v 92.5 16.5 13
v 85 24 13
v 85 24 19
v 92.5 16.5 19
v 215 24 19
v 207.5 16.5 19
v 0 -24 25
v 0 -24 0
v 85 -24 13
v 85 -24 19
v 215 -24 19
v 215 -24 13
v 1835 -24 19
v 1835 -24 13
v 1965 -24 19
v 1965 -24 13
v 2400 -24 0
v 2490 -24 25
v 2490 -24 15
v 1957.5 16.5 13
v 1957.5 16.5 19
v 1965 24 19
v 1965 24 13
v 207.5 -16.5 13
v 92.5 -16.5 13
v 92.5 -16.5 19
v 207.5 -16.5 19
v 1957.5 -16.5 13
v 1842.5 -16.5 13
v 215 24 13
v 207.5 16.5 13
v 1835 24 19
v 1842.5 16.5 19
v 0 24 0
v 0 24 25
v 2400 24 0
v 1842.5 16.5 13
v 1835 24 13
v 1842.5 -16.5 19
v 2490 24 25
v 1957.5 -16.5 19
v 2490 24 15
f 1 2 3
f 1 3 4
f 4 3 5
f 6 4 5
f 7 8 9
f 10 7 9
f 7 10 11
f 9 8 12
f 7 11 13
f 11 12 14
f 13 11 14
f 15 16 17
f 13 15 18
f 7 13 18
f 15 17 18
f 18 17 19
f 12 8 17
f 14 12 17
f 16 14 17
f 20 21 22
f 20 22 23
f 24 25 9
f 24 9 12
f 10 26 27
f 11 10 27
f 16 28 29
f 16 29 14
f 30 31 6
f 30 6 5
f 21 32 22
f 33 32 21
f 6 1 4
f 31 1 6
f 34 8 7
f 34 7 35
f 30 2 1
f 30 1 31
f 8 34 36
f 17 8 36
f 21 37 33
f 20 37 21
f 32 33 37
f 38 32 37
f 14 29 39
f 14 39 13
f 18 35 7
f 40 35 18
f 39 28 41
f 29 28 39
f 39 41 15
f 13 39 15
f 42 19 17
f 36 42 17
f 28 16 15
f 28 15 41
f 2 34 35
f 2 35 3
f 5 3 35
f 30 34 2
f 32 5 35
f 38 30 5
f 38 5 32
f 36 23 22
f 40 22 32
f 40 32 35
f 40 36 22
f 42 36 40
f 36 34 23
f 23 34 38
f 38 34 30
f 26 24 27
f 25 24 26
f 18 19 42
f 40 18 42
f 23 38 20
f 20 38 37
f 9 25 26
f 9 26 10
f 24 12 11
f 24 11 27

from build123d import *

# Parameters (mm, degrees)
SKETCH_1_W             = 2490
SKETCH_1_H             = 48
EXTRUDE_1_DEPTH        = 25
SKETCH_2_W             = 115
SKETCH_2_H             = 6
CUT_EXTRUDE_1_DEPTH    = 7.5
DRAFT_1_ANGLE          = 45
MIRROR_START           = 13
MIRROR_1_DEPTH         = 6
PATTERN_START          = 13
PATTERN_LINEAR_1_DEPTH = 6
CUT_EXTRUDE_2_REACH    = 2492.588


# Read off the part's stored shape, not the designer's step: 镜向1, 阵列(线性)1
with BuildPart() as part:
    # 草图1 → 凸台-拉伸1 (new body)
    with BuildSketch(Plane.XY):
        with Locations((1245, 0)):
            Rectangle(SKETCH_1_W, SKETCH_1_H)
    extrude(amount=EXTRUDE_1_DEPTH)

    # 草图2 → 切除-拉伸1 (cut)
    with BuildSketch(Plane(origin=(0, 24, 0), x_dir=(1, 0, 0), z_dir=(0, 1, 0))):
        with Locations((1900, -16)):
            Rectangle(SKETCH_2_W, SKETCH_2_H)
    extrude(amount=-CUT_EXTRUDE_1_DEPTH, mode=Mode.SUBTRACT)

    # 拔模1
    draft_1_faces = [part.faces().sort_by_distance(p)[0] for p in [
        (1957.5, 20.25, 16),
        (1842.5, 20.25, 16),
    ]]
    draft(draft_1_faces, Plane(origin=(0, 16.5, 0), x_dir=(1, 0, 0), z_dir=(0, 1, 0)), DRAFT_1_ANGLE)

    # 镜向1 outline → 镜向1 (cut)
    with BuildSketch(Plane.XY.offset(MIRROR_START)):
        Polygon((1957.5, -16.5), (1842.5, -16.5), (1835, -24), (1965, -24), align=None)
    extrude(amount=MIRROR_1_DEPTH, mode=Mode.SUBTRACT)

    # 阵列(线性)1 outline → 阵列(线性)1 (cut)
    with BuildSketch(Plane.XY.offset(PATTERN_START)):
        Polygon((215, -24), (207.5, -16.5), (92.5, -16.5), (85, -24), align=None)
        Polygon((207.5, 16.5), (215, 24), (85, 24), (92.5, 16.5), align=None)
    extrude(amount=PATTERN_LINEAR_1_DEPTH, mode=Mode.SUBTRACT)

    # 草图3 → 切除-拉伸2 (cut, up to next)
    with BuildSketch(Plane.XZ.offset(24), mode=Mode.PRIVATE) as cut_extrude_2_sk1:
        Polygon((2400, 0), (2490, 0), (2490, 15), align=None)
    cut_extrude_2_tool1 = extrude(cut_extrude_2_sk1.sketch, amount=-CUT_EXTRUDE_2_REACH, mode=Mode.PRIVATE) & part.part
    add(cut_extrude_2_tool1.solids().sort_by_distance((2460, -24, 5))[0], mode=Mode.SUBTRACT)


solid = part.part
